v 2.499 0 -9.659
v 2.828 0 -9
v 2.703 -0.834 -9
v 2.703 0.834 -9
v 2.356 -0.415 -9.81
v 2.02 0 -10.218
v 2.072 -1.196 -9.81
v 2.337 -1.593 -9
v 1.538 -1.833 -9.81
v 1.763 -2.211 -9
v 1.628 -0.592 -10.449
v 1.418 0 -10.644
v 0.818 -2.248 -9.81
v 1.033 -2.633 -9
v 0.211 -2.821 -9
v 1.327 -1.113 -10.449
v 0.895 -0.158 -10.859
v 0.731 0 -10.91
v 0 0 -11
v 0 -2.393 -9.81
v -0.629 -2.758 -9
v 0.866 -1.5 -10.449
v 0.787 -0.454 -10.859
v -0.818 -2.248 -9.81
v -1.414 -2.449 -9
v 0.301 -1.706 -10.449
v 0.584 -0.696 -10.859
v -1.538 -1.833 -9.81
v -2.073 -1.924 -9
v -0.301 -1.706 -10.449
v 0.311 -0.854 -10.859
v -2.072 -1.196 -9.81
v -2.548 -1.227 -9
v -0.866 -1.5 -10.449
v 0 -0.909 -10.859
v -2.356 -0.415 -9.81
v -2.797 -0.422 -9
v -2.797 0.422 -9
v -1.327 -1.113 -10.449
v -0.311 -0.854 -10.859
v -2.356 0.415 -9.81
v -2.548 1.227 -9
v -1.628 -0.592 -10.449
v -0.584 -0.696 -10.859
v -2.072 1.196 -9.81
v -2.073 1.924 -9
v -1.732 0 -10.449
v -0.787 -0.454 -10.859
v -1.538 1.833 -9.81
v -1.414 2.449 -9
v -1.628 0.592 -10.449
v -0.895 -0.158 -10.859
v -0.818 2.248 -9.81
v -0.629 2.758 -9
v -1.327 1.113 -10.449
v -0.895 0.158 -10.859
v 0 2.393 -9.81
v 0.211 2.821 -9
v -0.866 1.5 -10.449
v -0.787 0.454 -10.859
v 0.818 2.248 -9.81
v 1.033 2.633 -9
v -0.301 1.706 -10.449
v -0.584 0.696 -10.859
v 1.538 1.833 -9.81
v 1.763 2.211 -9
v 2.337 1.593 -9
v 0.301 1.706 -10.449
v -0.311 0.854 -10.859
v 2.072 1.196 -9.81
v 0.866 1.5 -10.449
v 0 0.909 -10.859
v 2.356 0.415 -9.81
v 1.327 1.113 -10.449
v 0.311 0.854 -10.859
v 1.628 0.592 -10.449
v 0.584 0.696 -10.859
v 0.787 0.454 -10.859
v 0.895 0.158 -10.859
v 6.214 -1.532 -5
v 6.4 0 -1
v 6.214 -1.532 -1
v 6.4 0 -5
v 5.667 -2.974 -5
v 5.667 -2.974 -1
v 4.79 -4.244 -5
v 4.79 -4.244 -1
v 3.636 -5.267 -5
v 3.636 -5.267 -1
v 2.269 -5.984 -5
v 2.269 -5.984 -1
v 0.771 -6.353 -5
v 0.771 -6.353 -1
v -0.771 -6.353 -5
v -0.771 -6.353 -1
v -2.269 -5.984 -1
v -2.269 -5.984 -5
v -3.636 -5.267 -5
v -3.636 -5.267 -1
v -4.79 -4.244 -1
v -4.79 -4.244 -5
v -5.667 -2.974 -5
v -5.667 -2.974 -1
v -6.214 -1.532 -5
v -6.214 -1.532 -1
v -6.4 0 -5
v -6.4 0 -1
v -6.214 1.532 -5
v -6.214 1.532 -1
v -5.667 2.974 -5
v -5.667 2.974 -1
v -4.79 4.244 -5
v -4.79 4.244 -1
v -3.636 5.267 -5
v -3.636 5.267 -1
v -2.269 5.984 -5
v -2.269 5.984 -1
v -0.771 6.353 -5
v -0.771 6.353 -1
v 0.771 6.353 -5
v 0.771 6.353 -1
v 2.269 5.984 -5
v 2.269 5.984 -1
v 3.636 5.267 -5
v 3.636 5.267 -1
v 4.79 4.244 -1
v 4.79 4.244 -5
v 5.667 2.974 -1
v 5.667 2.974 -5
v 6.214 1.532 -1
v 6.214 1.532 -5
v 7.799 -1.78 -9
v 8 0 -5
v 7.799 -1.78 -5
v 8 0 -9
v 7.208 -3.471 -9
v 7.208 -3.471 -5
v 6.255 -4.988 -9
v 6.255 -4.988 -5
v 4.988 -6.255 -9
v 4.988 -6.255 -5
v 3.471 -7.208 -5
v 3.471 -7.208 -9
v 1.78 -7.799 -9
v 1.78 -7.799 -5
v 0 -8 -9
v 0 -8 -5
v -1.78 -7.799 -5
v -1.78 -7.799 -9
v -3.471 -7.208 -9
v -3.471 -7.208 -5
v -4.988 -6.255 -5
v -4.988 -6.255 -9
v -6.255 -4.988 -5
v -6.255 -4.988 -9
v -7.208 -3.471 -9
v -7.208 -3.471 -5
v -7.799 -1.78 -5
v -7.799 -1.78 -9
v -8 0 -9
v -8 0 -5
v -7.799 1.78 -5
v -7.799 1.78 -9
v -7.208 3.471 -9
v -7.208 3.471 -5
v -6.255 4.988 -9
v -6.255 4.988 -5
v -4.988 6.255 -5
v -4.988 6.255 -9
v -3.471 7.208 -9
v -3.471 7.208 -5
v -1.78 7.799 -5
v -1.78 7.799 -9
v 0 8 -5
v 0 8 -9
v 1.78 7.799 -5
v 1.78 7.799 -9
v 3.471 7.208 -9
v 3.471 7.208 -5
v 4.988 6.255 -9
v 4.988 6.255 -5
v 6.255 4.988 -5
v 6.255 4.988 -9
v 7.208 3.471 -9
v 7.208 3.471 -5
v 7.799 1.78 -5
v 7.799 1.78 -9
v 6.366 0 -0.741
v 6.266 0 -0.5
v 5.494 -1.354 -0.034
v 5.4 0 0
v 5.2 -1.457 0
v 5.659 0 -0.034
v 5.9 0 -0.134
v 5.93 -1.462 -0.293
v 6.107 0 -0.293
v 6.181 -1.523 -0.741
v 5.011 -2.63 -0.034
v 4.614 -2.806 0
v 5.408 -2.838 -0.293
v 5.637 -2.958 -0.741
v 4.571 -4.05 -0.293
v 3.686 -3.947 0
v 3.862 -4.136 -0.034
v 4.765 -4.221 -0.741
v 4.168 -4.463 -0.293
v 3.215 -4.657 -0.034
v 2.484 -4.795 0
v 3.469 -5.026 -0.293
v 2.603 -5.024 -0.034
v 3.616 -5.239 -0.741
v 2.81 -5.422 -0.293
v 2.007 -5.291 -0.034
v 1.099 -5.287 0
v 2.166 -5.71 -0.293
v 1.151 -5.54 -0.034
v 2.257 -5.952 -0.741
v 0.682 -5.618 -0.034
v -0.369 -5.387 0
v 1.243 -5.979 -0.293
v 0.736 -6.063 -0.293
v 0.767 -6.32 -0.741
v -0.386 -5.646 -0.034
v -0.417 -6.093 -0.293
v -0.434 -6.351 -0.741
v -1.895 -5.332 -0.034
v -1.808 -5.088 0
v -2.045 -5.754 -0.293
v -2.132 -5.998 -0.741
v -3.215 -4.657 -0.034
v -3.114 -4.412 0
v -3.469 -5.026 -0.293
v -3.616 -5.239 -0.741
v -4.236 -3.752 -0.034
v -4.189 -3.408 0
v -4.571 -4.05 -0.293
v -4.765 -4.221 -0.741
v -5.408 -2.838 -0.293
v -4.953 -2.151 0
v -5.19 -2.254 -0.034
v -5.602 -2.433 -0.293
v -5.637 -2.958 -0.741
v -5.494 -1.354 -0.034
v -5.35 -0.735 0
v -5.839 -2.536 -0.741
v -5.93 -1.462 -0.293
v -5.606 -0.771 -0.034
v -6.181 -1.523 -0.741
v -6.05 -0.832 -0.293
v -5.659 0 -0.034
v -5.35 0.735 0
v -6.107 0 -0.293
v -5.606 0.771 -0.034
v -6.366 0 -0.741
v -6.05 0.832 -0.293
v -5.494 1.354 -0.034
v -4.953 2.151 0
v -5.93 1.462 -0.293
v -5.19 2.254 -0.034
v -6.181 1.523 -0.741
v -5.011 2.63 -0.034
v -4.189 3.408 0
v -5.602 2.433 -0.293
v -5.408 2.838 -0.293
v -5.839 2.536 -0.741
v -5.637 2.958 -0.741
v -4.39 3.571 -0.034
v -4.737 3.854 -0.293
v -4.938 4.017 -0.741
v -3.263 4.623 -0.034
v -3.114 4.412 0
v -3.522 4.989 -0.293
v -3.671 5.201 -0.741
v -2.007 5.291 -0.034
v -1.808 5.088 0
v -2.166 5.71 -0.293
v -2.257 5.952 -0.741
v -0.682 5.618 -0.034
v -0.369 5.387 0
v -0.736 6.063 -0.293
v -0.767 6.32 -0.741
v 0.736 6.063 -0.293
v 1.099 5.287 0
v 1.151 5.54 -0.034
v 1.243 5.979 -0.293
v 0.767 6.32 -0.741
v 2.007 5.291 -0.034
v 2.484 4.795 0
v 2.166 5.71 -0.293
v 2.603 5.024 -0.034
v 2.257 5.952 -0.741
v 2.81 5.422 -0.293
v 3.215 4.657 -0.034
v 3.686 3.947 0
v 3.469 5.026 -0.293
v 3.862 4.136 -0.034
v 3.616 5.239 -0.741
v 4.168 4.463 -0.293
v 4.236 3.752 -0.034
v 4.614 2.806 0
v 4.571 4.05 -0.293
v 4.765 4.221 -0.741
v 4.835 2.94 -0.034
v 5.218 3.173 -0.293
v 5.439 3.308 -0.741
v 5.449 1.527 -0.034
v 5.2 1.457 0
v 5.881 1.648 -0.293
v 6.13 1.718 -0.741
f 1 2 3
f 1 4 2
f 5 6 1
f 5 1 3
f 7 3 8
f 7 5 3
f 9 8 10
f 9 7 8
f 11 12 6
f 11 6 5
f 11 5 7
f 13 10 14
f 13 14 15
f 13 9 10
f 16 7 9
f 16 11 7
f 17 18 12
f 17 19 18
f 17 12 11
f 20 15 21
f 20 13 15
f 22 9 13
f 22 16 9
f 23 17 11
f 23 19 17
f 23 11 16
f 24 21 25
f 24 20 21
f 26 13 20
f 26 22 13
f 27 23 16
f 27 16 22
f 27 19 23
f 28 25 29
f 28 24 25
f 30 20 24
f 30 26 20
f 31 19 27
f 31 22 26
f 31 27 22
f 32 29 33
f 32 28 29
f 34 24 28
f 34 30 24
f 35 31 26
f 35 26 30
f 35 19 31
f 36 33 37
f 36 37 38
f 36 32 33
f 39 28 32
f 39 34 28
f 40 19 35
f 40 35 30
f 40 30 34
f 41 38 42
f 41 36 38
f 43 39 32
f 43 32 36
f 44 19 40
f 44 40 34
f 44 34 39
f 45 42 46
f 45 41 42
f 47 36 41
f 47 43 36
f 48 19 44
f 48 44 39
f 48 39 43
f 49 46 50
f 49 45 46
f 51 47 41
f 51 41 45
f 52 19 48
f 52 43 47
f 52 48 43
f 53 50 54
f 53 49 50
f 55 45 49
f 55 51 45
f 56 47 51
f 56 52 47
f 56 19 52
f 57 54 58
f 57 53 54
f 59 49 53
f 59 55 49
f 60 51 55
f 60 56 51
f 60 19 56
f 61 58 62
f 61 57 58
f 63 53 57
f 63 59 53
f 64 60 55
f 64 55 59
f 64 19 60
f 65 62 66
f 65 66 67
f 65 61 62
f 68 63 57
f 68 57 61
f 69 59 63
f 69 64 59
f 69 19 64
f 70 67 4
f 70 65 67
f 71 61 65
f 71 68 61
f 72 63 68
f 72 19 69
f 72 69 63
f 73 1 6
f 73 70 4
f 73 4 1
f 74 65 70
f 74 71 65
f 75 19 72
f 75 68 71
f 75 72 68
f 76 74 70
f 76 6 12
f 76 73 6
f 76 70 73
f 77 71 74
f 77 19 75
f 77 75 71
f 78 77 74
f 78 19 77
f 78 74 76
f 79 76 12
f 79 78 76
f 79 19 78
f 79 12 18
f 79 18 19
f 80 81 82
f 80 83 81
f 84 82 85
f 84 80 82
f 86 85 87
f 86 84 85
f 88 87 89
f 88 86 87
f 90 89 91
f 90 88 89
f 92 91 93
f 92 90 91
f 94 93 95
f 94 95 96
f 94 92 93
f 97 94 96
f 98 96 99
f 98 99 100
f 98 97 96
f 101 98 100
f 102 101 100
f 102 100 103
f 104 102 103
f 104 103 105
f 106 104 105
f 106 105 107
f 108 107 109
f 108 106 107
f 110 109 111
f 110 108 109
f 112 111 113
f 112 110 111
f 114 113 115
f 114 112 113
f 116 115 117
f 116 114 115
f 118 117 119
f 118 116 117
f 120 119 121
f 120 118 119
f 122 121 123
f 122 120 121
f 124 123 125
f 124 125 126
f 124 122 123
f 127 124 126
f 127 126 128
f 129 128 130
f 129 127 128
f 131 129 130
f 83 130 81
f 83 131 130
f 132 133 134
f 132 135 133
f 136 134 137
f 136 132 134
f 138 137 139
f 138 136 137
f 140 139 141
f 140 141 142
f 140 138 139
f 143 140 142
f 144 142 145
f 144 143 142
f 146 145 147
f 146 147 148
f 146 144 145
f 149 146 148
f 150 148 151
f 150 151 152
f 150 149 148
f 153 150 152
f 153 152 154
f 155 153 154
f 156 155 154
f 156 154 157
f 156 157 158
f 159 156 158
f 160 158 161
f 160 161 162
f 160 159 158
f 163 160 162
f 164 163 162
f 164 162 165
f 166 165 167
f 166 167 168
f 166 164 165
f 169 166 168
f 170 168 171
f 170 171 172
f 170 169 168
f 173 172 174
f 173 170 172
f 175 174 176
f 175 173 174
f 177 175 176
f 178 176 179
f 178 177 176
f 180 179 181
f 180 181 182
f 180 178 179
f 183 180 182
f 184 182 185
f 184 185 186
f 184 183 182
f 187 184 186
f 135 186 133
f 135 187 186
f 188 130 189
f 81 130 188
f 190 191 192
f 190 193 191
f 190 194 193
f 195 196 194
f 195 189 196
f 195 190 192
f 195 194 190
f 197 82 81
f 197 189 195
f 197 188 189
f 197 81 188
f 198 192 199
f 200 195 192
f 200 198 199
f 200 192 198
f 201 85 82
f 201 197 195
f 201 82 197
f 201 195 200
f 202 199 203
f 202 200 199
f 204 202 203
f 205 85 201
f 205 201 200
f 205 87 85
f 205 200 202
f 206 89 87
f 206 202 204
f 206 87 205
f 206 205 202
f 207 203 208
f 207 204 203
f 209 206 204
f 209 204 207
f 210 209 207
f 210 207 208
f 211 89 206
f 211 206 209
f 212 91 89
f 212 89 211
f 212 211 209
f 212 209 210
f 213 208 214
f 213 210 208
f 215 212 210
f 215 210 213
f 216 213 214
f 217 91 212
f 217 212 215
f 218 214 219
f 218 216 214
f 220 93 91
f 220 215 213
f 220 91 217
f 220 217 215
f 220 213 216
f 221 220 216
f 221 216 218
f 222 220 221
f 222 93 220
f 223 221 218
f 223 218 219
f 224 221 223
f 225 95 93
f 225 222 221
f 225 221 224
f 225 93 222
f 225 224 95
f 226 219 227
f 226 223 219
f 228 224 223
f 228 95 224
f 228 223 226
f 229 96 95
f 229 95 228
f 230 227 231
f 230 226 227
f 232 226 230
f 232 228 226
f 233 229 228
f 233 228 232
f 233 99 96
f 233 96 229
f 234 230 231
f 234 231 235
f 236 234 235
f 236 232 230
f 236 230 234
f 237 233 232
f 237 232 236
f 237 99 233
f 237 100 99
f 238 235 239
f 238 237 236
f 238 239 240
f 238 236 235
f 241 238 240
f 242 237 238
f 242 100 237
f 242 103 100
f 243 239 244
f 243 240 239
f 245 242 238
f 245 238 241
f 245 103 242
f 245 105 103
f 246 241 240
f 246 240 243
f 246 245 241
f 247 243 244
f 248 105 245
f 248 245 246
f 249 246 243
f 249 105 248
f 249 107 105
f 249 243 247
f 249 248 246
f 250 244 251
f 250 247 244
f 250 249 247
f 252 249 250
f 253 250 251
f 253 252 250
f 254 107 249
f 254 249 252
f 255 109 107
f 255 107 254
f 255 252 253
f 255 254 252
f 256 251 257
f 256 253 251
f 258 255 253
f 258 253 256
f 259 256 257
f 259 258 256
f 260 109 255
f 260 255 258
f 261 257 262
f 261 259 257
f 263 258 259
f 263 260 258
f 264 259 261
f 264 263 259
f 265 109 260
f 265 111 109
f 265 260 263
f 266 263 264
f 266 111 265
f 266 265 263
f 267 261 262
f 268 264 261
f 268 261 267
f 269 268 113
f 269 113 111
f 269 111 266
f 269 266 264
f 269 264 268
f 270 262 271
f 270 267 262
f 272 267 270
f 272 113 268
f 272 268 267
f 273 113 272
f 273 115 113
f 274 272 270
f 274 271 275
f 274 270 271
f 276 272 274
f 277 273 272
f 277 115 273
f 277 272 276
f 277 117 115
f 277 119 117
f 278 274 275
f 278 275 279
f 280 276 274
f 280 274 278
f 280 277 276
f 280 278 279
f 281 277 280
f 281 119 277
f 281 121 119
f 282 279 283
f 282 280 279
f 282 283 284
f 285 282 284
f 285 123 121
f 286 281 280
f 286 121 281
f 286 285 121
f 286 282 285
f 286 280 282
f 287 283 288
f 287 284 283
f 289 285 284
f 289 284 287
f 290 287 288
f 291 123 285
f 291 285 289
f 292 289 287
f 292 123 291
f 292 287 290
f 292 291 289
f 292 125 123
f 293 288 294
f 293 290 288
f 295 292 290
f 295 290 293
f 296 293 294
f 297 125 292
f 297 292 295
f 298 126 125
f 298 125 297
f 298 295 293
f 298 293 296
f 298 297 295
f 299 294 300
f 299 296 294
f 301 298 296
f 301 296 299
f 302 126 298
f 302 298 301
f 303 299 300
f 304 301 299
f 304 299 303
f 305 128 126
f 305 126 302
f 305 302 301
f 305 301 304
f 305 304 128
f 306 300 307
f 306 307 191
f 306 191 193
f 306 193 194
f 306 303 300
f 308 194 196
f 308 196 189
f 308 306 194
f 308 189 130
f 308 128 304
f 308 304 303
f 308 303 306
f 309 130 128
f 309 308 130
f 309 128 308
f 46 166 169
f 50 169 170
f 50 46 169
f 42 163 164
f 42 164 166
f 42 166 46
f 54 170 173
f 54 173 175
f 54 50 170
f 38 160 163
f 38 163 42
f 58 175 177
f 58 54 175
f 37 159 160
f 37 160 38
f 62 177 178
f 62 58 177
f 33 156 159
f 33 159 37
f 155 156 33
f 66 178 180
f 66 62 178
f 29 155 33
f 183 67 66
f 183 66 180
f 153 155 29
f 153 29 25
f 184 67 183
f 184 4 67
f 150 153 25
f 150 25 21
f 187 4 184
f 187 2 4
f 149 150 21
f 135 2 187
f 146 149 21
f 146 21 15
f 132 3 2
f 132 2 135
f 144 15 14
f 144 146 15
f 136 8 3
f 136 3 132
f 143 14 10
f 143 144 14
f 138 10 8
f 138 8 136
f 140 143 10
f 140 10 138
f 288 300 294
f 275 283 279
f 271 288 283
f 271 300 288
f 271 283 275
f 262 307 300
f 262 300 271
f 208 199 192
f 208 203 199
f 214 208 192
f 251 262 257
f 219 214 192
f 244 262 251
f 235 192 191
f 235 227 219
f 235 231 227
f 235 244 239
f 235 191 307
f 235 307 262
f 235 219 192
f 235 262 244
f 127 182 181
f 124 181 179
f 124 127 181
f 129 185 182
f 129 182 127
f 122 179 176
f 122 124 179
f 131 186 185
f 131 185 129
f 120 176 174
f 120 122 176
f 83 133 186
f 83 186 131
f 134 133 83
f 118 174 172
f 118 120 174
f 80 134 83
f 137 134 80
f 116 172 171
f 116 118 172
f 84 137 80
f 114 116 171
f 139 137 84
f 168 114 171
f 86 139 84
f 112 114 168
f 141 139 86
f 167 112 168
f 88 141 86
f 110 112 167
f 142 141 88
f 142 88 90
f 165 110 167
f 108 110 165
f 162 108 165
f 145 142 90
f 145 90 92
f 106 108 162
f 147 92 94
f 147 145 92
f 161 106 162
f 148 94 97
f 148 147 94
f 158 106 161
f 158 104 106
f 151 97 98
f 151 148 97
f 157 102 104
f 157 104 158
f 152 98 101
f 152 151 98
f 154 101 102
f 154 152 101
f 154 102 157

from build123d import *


with BuildPart() as part:
    # Sketch1 → Revolve1 (revolve)
    with BuildSketch(Plane(origin=(0, 0, 0), x_dir=(1, 0, 0), z_dir=(0, 1, 0))):
        with BuildLine():
            Line((0, 0), (5.4, 0))
            ThreePointArc((5.4, 0), (6.107106781, 0.292893219), (6.4, 1))
            Line((6.4, 1), (6.4, 5))
            Line((6.4, 5), (8, 5))
            Line((8, 5), (8, 9))
            Line((8, 9), (2.828427125, 9))
            ThreePointArc((2.828427125, 9), (1.732050808, 10.449489743), (0, 11))
            Line((0, 11), (0, 0))
        make_face()
    revolve(axis=Axis((0, 0, 0), (0, 0, -1)))


solid = part.part
